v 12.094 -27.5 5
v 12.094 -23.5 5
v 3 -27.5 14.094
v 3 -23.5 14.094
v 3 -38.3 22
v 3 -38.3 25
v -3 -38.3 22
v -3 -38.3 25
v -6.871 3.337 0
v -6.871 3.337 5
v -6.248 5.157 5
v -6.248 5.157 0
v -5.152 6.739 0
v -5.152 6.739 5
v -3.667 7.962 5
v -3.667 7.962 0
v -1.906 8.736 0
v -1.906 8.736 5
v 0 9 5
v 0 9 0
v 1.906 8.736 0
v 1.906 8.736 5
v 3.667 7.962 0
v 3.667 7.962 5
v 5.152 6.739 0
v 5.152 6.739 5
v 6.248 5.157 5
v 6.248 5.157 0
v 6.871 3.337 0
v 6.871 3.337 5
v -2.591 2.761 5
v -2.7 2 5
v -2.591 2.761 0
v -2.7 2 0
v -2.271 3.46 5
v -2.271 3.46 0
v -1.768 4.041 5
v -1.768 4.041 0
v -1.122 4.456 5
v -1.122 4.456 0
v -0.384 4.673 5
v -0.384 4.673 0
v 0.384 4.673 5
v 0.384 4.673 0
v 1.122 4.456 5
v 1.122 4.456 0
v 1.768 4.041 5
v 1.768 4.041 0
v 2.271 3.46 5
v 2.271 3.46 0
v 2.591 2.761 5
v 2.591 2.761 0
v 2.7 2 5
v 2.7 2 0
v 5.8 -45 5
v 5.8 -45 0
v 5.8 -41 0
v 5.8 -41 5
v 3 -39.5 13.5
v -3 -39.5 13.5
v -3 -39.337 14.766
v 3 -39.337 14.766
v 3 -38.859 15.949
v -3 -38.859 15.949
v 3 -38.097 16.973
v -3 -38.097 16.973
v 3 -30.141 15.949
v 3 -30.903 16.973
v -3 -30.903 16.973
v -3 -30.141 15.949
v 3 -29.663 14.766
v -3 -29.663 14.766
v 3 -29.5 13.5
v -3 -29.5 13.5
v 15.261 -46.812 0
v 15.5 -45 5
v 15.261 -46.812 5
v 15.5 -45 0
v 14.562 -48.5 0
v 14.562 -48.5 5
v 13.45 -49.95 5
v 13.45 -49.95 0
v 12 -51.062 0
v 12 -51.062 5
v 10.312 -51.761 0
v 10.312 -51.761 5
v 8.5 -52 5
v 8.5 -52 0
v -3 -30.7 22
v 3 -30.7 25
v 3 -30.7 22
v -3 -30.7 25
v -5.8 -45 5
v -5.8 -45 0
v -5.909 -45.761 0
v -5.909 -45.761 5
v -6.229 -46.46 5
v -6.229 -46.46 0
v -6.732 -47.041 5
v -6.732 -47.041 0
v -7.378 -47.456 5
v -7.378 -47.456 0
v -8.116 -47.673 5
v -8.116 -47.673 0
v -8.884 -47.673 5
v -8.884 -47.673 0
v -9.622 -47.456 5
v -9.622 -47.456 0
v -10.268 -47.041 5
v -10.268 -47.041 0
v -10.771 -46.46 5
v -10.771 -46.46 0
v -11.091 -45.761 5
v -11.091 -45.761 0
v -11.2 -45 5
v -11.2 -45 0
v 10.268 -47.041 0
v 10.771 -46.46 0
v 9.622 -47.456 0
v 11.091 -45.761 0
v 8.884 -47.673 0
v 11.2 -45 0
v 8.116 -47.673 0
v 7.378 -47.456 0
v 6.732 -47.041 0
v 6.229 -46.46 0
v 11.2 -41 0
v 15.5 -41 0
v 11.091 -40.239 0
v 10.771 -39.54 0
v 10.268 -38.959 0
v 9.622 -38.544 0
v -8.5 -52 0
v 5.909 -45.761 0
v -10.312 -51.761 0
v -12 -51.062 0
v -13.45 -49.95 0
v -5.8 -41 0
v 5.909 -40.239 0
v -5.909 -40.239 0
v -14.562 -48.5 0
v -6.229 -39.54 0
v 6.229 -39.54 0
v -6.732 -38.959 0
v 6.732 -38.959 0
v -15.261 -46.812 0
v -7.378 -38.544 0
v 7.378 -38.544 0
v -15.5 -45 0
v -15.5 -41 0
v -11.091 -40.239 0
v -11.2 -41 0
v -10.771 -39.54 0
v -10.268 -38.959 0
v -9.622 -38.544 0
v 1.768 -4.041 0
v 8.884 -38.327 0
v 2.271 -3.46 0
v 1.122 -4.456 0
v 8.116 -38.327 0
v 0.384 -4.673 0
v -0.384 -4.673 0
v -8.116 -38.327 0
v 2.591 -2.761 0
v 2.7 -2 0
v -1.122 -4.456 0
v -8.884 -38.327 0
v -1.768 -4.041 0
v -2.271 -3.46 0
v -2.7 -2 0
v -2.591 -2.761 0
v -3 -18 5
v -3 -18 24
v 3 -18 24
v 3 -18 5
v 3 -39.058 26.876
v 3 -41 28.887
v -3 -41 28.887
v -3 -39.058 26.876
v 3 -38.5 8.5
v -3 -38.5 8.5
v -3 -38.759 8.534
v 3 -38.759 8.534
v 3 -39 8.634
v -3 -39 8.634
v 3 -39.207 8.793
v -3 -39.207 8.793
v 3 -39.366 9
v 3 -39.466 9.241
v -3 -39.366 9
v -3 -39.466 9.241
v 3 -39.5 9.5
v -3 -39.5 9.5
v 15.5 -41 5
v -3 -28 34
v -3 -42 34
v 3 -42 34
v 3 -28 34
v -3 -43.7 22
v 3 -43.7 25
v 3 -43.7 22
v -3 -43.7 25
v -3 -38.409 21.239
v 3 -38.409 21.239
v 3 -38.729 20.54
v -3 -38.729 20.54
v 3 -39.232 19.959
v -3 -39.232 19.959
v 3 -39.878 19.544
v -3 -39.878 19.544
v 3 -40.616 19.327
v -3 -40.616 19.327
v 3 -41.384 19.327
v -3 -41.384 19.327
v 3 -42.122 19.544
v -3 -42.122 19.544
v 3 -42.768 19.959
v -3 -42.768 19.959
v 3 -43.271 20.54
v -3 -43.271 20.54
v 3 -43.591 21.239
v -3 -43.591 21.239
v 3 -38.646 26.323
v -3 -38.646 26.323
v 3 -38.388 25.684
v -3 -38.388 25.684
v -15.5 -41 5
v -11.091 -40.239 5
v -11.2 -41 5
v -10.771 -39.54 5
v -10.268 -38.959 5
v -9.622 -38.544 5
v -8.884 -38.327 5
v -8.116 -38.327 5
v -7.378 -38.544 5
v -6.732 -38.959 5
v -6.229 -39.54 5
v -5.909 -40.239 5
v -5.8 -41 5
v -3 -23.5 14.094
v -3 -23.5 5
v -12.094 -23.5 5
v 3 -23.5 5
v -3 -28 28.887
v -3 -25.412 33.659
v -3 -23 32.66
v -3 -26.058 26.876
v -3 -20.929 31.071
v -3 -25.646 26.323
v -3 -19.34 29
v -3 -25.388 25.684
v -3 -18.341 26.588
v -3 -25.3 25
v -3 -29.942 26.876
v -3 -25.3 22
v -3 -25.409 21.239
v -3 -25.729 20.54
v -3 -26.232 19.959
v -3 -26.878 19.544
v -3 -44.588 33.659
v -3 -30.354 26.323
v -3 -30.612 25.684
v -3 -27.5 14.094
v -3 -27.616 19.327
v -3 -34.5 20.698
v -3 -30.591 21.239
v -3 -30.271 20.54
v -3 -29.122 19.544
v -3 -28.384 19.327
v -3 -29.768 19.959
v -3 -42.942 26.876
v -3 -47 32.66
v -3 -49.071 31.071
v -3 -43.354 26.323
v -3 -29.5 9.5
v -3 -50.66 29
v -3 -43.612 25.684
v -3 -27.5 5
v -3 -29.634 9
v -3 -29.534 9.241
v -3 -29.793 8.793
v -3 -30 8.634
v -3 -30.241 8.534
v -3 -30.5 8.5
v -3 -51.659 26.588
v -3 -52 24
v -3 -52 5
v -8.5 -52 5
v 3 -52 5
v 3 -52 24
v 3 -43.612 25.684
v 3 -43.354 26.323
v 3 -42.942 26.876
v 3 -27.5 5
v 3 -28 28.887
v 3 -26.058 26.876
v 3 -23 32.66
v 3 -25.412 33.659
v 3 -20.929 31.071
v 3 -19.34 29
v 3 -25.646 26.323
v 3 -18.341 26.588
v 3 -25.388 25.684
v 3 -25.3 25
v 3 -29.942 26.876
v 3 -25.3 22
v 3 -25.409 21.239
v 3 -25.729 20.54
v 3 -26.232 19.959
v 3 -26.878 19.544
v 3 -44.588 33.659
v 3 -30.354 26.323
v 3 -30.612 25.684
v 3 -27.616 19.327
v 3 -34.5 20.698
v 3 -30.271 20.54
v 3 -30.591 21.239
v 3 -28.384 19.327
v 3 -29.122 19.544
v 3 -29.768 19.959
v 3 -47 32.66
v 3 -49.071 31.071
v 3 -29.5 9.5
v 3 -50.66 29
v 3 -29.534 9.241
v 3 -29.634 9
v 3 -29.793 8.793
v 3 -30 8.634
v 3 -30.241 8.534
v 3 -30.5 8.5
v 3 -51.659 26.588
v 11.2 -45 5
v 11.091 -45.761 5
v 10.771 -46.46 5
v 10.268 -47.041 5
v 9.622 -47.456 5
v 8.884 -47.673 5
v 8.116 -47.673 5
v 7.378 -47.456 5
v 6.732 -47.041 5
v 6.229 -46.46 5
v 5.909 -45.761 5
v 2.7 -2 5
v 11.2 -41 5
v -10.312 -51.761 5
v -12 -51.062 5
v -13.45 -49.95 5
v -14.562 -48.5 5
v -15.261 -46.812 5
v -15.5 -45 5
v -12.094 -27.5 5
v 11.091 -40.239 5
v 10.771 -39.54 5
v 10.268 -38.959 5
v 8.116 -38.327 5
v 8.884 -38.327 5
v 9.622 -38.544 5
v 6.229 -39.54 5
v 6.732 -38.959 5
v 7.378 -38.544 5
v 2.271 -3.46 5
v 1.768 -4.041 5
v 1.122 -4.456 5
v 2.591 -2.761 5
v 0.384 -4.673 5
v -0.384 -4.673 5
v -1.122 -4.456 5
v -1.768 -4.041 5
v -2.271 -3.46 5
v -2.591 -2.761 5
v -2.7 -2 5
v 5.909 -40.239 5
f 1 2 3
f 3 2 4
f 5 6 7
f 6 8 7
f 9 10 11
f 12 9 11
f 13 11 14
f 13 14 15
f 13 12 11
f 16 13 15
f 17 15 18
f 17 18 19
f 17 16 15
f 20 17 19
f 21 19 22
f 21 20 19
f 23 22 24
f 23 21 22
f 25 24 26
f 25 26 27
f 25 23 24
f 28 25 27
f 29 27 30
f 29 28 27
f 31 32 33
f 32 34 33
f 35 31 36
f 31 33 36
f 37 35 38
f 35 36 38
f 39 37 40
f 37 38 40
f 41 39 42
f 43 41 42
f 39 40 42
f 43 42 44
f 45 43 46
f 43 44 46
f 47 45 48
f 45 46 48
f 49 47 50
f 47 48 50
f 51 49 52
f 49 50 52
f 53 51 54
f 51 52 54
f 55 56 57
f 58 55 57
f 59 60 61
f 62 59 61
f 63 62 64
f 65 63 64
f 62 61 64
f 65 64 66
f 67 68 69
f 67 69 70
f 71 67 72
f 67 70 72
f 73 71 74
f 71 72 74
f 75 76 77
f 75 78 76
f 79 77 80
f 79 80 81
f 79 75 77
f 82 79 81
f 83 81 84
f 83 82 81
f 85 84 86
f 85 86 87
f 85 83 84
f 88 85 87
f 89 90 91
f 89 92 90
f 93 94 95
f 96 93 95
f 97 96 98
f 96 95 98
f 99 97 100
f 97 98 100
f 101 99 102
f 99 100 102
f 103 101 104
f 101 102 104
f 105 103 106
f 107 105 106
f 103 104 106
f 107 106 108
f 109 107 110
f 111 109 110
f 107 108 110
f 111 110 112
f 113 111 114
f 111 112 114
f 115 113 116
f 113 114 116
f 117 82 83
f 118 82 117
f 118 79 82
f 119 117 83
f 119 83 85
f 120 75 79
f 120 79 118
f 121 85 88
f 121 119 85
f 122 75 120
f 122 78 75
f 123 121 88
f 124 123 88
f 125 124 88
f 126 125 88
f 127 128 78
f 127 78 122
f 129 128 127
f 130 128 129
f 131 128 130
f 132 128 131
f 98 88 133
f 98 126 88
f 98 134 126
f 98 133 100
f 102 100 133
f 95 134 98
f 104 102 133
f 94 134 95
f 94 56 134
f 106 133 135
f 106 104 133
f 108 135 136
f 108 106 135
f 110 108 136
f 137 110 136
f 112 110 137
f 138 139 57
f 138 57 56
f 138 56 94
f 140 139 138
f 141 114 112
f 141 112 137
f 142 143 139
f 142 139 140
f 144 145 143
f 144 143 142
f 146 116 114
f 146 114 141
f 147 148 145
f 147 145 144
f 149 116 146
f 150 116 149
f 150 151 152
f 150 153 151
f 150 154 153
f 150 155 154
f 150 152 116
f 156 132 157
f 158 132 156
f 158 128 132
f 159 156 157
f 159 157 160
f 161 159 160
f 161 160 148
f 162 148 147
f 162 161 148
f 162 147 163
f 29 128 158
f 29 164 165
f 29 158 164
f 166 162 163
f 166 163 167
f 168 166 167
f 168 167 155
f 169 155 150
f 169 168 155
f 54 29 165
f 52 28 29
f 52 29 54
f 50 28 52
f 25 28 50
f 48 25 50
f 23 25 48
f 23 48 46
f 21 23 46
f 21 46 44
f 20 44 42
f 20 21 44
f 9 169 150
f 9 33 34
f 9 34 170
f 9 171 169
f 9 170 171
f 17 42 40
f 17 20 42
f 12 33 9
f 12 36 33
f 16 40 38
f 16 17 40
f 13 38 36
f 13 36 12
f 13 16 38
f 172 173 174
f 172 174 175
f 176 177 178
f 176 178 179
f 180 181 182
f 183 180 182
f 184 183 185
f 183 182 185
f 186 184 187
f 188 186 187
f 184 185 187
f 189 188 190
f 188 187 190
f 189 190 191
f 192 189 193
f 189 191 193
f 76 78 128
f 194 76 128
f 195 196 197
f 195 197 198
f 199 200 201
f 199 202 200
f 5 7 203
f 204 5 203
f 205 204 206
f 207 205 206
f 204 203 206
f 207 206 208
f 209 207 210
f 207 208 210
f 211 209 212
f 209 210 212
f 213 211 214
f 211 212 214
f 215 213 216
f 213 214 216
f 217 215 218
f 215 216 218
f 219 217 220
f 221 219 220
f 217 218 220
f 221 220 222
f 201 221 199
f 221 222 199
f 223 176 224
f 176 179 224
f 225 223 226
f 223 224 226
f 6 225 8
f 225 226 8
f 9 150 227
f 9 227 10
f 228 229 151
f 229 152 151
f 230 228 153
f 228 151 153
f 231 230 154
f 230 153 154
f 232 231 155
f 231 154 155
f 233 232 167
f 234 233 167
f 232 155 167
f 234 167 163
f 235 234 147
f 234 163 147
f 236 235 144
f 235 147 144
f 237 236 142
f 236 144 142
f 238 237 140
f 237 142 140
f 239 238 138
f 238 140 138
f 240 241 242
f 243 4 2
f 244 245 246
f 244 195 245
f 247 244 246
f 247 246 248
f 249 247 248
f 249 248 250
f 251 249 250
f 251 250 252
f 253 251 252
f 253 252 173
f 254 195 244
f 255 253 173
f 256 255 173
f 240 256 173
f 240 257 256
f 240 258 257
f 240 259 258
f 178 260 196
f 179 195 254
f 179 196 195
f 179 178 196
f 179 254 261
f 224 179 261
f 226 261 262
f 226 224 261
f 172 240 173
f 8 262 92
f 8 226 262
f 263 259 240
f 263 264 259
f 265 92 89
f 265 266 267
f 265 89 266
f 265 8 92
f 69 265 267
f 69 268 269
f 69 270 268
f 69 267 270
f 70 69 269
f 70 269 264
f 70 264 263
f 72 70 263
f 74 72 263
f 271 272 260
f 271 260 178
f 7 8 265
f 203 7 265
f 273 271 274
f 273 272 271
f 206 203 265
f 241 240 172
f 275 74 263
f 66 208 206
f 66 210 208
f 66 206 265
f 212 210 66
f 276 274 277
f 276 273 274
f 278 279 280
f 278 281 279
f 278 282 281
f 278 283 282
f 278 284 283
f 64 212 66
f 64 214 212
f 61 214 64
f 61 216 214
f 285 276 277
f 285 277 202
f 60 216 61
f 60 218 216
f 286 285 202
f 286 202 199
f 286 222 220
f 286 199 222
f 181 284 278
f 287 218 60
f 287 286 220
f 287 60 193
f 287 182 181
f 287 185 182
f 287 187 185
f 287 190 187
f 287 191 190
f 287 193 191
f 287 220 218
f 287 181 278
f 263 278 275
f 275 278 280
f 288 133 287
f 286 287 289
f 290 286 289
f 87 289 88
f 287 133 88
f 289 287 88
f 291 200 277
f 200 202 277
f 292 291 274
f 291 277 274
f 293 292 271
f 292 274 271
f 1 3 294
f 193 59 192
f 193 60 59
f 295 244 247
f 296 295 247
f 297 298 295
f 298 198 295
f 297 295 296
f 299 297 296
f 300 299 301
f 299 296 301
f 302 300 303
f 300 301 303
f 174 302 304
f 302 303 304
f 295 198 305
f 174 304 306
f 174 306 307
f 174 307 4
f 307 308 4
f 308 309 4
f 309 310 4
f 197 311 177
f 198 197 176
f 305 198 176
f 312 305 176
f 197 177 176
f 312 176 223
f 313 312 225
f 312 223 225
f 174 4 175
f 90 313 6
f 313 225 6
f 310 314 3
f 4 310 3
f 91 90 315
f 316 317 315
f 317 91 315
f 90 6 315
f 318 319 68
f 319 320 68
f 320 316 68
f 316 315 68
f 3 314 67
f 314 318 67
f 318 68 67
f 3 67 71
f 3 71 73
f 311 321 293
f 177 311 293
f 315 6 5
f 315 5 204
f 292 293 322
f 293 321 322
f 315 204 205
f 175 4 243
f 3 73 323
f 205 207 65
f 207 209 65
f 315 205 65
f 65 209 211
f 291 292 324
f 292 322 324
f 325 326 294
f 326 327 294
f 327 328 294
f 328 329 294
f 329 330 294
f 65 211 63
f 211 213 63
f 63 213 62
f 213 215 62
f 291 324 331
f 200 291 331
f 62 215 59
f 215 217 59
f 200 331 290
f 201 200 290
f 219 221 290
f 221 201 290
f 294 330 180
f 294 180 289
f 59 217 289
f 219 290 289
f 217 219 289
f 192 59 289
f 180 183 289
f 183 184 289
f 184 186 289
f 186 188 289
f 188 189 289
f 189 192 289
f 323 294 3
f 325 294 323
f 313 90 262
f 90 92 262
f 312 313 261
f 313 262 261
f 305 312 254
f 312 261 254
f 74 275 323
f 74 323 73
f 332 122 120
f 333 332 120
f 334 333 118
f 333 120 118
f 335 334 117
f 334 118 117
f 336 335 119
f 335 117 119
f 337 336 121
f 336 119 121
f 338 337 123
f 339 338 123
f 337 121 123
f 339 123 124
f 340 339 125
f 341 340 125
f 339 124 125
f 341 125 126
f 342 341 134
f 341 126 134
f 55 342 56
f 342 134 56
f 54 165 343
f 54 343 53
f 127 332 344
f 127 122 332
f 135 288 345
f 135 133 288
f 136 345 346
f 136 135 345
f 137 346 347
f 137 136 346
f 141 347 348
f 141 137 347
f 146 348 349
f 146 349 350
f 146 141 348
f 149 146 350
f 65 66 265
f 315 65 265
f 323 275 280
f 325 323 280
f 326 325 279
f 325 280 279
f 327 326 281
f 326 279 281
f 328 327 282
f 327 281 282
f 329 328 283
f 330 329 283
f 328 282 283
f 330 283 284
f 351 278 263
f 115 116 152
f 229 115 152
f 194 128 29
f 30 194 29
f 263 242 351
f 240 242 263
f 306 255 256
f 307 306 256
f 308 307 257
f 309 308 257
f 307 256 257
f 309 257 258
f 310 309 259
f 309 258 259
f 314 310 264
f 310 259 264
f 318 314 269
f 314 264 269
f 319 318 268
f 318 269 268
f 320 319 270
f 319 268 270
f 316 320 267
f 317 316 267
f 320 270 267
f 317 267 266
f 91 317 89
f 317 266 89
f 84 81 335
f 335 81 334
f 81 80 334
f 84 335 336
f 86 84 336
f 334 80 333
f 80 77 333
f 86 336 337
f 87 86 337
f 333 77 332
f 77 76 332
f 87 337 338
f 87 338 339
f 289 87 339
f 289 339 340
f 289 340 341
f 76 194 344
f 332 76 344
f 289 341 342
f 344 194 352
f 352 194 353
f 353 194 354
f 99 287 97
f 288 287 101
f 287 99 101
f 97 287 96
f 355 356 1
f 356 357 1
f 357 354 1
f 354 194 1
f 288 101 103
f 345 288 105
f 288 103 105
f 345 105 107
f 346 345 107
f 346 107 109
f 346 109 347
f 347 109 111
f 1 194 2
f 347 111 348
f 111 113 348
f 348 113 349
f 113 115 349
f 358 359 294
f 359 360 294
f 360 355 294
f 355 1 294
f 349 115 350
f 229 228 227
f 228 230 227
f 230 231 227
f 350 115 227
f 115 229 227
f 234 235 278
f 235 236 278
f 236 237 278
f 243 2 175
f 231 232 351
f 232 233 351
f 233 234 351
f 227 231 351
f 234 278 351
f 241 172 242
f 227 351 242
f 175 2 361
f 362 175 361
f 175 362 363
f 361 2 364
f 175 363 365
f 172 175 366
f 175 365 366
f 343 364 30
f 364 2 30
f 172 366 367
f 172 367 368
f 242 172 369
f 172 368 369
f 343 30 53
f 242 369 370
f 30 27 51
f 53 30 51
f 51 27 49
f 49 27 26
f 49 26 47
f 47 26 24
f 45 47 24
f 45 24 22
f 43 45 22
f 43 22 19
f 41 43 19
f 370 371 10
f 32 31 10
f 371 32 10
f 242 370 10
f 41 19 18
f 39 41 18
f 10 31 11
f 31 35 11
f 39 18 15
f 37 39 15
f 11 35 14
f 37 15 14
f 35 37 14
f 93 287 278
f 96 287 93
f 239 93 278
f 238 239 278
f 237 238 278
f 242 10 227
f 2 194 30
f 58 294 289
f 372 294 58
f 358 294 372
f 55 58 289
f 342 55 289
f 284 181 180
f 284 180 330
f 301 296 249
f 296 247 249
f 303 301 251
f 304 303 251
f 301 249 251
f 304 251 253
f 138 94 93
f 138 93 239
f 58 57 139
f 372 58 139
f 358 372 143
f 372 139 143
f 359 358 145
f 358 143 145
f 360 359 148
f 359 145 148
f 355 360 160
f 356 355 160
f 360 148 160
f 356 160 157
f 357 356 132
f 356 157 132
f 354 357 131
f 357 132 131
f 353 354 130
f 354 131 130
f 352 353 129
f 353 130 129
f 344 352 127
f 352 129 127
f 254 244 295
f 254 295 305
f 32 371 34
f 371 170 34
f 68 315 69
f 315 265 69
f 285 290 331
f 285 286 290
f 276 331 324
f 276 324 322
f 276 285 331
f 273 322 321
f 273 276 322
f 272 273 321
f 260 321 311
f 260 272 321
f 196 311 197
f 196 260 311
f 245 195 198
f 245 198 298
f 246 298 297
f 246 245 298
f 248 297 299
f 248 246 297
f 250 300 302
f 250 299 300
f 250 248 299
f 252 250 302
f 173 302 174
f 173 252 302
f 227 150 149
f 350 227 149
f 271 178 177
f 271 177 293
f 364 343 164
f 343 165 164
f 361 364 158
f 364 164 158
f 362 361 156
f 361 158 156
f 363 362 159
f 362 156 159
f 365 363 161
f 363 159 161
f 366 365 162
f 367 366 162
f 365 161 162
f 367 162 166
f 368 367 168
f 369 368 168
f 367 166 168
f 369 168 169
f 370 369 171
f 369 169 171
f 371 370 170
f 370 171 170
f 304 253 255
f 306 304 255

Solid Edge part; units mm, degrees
sketch "Sketch1" plane through (0, 0, 0) normal (0, 0, 1) x (1, 0, 0)
  line L0 (-15.5, -41) -> (-6.8711, 3.3373)
  line L1 (15.5, -41) -> (6.8711, 3.3373)
  line L2 (15.5, -45) -> (15.5, -41)
  line L3 (-8.5, -52) -> (8.5, -52)
  line L4 (-15.5, -41) -> (-15.5, -45)
  arc A0 (-6.8711, 3.3373) -> (6.8711, 3.3373) centre (0, 2) cw
  arc A1 (15.5, -45) -> (8.5, -52) centre (8.5, -45) cw
  arc A2 (-8.5, -52) -> (-15.5, -45) centre (-8.5, -45) cw
  line L5 (-2.7, -2) -> (-2.7, 2)
  line L6 (2.7, -2) -> (2.7, 2)
  arc A3 (2.7, -2) -> (-2.7, -2) centre (0, -2) cw
  arc A4 (-2.7, 2) -> (2.7, 2) centre (0, 2) cw
  arc A5 (-11.2, -41) -> (-5.8, -41) centre (-8.5, -41) cw
  line L7 (-5.8, -45) -> (-5.8, -41)
  arc A6 (-5.8, -45) -> (-11.2, -45) centre (-8.5, -45) cw
  line L8 (-11.2, -45) -> (-11.2, -41)
  arc A7 (5.8, -41) -> (11.2, -41) centre (8.5, -41) cw
  line L9 (11.2, -45) -> (11.2, -41)
  arc A8 (11.2, -45) -> (5.8, -45) centre (8.5, -45) cw
  line L10 (5.8, -45) -> (5.8, -41)
extrude "Protrusion1" add sketch "Sketch1" along normal blind 5
sketch "Sketch2" plane through (0, 0, 0) normal (1, 0, 0) x (0, 1, 0)
  line L0 (-52, 0) -> (-52, 34)
  line L1 (-52, 34) -> (-18, 34)
  line L2 (-18, 34) -> (-18, 0)
  line L3 (-18, 0) -> (-52, 0)
  dimension "D1" = 34
  dimension "D2" = 34
extrude "ExtrudedProtrusion_4" add sketch "Sketch2" along normal mid plane 6
sketch "Sketch3" plane through (0, 0, 0) normal (1, 0, 0) x (0, 1, 0)
  line L0 (-43.7, 25) -> (-43.7, 22)
  line L1 (-38.3, 25) -> (-38.3, 22)
  arc A0 (-39.0578, 26.8756) -> (-38.3, 25) centre (-41, 25) cw
  line L2 (-41, 28.8868) -> (-39.0578, 26.8756)
  line L3 (-41, 28.8868) -> (-42.9422, 26.8756)
  arc A1 (-43.7, 22) -> (-38.3, 22) centre (-41, 22) ccw
  arc A2 (-42.9422, 26.8756) -> (-43.7, 25) centre (-41, 25) ccw
  line L4 (-25.3, 25) -> (-25.3, 22)
  arc A3 (-25.3, 22) -> (-30.7, 22) centre (-28, 22) cw
  line L5 (-30.7, 25) -> (-30.7, 22)
  arc A4 (-29.9422, 26.8756) -> (-30.7, 25) centre (-28, 25) ccw
  line L6 (-28, 28.8868) -> (-29.9422, 26.8756)
  line L7 (-28, 28.8868) -> (-26.0578, 26.8756)
  arc A5 (-25.3, 25) -> (-26.0578, 26.8756) centre (-28, 25) ccw
  line L8 (-39.5, 13.5) -> (-39.5, 9.5)
  arc A6 (-39.5, 9.5) -> (-38.5, 8.5) centre (-38.5, 9.5) ccw
  line L9 (-38.5, 8.5) -> (-30.5, 8.5)
  arc A7 (-30.5, 8.5) -> (-29.5, 9.5) centre (-30.5, 9.5) ccw
  line L10 (-29.5, 9.5) -> (-29.5, 13.5)
  line L11 (-34.5, 20.6978) -> (-30.9033, 16.9733)
  line L12 (-38.0967, 16.9733) -> (-34.5, 20.6978)
  arc A8 (-39.5, 13.5) -> (-38.0967, 16.9733) centre (-34.5, 13.5) cw
  arc A9 (-29.5, 13.5) -> (-30.9033, 16.9733) centre (-34.5, 13.5) ccw
  dimension "D1" = 8
  dimension "D2" = 7
  dimension "D3" = 3
extrude "Cutout1" cut sketch "Sketch3" along normal through all and the other way through all
sketch "Sketch4" plane through (0, -23.5, 0) normal (0, -1, 0) x (1, 0, 0)
  line L0 (3, 5) -> (12.0941, 5)
  line L1 (12.0941, 5) -> (3, 14.0941)
  line L2 (3, 5) -> (3, 14.0941)
  line L3 (-3, 5) -> (-12.0941, 5)
  line L4 (-12.0941, 5) -> (-3, 14.0941)
  line L5 (-3, 14.0941) -> (-3, 5)
extrude "ExtrudedProtrusion_3" add sketch "Sketch4" along normal blind 4
fillet "Round_1" radius 10 2 edges at (0, -52, 34) (0, -18, 34)
properties material "ABS Plastic, medium impact"
